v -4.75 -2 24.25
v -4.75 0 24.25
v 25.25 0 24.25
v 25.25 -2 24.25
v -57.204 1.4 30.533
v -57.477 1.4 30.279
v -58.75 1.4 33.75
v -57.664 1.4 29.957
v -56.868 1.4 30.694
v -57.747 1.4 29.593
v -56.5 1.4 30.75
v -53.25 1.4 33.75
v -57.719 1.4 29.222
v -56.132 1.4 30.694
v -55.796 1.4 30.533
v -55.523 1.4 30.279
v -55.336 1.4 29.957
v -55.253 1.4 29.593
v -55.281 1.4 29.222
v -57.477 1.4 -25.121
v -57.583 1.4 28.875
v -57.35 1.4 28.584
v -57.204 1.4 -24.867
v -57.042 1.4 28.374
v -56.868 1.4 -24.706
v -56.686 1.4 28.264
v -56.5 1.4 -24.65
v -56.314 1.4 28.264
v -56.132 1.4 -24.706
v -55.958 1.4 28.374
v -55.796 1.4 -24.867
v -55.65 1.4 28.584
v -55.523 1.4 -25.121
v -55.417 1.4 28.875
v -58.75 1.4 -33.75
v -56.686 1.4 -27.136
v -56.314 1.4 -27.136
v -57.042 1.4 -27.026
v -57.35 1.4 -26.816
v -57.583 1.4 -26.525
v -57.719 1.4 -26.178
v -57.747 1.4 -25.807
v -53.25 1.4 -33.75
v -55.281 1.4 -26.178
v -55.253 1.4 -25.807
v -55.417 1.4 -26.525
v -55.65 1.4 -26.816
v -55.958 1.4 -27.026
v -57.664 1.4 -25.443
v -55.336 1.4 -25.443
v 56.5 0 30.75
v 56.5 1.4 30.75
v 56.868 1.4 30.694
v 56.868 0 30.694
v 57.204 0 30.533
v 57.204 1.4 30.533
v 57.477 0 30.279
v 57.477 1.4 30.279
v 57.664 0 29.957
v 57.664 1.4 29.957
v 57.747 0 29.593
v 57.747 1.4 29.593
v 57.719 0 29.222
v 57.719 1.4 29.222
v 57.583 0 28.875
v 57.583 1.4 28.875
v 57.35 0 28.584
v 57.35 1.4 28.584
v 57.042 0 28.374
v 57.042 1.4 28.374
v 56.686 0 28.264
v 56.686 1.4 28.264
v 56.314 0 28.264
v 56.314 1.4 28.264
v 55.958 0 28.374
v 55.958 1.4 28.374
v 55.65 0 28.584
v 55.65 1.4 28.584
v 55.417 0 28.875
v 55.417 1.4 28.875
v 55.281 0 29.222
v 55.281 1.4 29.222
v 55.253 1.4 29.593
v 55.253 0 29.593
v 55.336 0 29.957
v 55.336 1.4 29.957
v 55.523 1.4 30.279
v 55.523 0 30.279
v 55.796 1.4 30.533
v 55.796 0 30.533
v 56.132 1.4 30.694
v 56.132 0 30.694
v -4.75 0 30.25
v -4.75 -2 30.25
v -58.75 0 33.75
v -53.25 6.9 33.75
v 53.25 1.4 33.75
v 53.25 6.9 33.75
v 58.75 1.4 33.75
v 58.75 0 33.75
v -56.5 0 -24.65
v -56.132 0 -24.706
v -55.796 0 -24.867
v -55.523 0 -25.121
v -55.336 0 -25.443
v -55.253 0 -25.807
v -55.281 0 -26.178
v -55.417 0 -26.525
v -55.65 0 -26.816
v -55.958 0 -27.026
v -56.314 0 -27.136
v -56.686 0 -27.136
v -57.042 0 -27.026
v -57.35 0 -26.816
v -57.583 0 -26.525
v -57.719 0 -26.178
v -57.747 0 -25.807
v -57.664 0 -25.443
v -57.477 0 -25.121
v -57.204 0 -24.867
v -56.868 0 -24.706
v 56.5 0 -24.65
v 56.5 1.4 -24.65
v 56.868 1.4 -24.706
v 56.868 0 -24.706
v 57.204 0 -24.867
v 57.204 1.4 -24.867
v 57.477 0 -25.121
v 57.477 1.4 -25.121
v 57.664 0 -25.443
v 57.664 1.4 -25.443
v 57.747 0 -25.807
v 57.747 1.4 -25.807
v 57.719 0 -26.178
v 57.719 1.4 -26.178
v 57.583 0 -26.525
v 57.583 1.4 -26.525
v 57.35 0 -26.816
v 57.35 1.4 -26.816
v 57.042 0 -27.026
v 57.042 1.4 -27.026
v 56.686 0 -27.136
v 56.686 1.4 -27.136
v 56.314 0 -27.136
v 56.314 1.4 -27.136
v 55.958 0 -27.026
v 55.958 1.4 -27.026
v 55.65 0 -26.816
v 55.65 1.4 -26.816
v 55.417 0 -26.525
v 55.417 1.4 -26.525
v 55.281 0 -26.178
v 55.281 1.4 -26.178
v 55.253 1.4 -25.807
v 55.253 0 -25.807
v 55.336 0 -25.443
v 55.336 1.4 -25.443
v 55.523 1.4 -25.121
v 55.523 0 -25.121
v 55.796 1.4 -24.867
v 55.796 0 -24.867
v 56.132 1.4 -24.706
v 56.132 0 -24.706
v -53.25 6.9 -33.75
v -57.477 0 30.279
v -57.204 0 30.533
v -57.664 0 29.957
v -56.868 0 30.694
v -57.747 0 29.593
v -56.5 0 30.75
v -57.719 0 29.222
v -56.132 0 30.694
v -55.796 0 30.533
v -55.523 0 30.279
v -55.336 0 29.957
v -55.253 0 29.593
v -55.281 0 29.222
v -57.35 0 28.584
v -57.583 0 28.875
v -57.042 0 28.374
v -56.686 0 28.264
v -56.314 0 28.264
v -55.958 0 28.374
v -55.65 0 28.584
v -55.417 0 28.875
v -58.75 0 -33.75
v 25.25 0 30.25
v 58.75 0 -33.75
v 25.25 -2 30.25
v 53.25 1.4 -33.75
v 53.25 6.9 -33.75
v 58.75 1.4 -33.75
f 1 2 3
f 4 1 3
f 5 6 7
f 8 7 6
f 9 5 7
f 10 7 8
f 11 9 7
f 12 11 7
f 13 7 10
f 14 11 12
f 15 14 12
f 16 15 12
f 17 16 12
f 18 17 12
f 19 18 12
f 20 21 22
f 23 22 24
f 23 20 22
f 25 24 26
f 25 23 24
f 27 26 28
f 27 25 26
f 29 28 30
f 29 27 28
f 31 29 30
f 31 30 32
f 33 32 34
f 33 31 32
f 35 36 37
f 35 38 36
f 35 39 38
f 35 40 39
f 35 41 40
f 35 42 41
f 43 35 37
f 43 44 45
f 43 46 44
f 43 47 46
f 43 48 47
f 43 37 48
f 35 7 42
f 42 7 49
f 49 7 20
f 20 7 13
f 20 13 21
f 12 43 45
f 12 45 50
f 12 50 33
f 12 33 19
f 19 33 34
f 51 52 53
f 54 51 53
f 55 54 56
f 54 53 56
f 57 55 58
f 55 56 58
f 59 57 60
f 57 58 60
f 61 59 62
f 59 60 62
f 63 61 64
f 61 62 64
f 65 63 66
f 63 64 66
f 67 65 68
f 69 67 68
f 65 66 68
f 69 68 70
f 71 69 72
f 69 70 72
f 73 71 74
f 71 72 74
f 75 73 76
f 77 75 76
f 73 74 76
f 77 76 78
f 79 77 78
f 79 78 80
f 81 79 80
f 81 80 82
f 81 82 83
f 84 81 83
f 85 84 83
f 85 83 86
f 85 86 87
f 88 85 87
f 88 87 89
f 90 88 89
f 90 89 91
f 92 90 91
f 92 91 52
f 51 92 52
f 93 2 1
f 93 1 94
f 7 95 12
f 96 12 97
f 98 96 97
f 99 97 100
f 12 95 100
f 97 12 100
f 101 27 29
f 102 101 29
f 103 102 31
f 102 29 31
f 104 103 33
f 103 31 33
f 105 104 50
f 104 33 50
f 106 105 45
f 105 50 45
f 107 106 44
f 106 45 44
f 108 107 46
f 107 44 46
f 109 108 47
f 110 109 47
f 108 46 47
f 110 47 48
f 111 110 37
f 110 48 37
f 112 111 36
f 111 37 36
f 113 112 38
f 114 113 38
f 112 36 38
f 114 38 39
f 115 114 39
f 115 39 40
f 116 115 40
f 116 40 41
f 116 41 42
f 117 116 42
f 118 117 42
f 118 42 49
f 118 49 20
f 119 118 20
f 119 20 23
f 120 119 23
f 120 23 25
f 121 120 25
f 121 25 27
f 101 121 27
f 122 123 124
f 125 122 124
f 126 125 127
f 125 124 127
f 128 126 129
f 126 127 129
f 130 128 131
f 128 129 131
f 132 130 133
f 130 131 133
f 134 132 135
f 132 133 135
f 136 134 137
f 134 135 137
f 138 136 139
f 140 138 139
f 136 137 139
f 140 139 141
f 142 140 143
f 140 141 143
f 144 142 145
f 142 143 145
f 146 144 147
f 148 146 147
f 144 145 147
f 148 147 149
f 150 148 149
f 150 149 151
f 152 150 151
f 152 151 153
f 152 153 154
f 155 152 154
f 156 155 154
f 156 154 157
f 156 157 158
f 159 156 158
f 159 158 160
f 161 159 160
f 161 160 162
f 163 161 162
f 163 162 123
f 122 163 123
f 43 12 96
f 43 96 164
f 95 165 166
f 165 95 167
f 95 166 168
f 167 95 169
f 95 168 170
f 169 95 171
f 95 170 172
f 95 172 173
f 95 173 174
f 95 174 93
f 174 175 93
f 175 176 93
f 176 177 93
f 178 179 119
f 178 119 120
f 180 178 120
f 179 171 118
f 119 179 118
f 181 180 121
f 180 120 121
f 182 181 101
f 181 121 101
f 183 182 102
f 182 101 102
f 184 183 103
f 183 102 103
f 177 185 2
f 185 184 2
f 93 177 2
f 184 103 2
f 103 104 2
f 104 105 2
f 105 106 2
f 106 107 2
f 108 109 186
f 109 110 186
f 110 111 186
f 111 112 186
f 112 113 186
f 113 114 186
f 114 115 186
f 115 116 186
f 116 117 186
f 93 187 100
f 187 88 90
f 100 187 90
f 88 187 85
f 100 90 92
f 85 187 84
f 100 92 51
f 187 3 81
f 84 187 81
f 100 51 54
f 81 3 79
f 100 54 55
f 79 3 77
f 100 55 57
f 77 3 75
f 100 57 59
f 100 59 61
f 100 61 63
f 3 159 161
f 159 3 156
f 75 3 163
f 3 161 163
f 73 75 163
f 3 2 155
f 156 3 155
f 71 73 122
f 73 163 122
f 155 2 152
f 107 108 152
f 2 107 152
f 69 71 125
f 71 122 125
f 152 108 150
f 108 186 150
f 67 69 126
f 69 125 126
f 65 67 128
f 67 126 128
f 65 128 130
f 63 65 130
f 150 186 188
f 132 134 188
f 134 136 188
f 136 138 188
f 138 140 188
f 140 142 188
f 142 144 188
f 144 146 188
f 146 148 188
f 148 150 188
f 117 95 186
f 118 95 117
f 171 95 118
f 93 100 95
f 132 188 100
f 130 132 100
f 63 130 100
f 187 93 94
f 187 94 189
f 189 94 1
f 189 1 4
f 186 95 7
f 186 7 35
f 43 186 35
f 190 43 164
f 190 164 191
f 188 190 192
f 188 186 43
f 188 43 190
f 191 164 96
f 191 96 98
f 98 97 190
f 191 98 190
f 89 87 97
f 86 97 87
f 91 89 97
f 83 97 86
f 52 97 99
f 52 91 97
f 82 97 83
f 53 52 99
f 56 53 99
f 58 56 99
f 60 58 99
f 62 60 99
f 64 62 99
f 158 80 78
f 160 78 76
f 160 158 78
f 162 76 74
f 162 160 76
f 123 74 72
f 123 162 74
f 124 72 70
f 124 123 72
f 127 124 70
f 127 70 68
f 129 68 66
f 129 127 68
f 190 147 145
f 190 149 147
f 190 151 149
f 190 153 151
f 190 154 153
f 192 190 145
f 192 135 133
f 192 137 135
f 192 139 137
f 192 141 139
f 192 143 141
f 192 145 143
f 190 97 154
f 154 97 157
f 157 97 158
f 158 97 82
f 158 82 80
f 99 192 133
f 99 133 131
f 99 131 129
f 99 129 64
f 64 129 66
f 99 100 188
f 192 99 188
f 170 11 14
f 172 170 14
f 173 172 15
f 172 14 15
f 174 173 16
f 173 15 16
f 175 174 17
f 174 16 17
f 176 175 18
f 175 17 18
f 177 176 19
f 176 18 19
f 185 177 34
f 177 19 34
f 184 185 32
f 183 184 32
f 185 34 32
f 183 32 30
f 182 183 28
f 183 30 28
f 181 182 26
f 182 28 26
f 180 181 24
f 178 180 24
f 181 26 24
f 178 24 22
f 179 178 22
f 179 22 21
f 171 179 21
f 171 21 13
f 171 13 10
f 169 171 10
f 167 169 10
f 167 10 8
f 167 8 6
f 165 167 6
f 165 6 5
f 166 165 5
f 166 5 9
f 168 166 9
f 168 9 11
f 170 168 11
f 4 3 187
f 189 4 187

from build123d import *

# Parameters (mm, degrees)
SKETCH_1_W          = 117.5
SKETCH_1_H          = 67.5
EXTRUDE_1_DEPTH     = 1.4
SKETCH_2_W          = 106.5
SKETCH_2_H          = 67.5
EXTRUDE_2_DEPTH     = 5.5
CUT_EXTRUDE_1_REACH = 69.977
SKETCH_5_R          = 1.25
SKETCH_6_W          = 30
SKETCH_6_H          = 6
EXTRUDE_3_DEPTH     = 2


with BuildPart() as part:
    # 草图1 → 凸台-拉伸1 (new body)
    with BuildSketch(Plane(origin=(0, 0, 0), x_dir=(1, 0, 0), z_dir=(0, 1, 0))):
        Rectangle(SKETCH_1_W, SKETCH_1_H)
    extrude(amount=EXTRUDE_1_DEPTH)

    # 草图2 → 凸台-拉伸2 (add)
    with BuildSketch(Plane(origin=(0, 1.4, 0), x_dir=(1, 0, 0), z_dir=(0, 1, 0))):
        Rectangle(SKETCH_2_W, SKETCH_2_H)
    extrude(amount=EXTRUDE_2_DEPTH)

    # 草图5 → 切除-拉伸1 (cut, up to next)
    with BuildSketch(Plane(origin=(0, 1.4, 0), x_dir=(1, 0, 0), z_dir=(0, 1, 0)), mode=Mode.PRIVATE) as cut_extrude_1_sk1:
        with Locations(Location((-56.5, -29.5, 0), (0, 0, 270))):
            Circle(SKETCH_5_R)
    cut_extrude_1_tool1 = extrude(cut_extrude_1_sk1.sketch, amount=-CUT_EXTRUDE_1_REACH, mode=Mode.PRIVATE) & part.part
    # 草图5 → 切除-拉伸1 (cut, up to next)
    with BuildSketch(Plane(origin=(0, 1.4, 0), x_dir=(1, 0, 0), z_dir=(0, 1, 0)), mode=Mode.PRIVATE) as cut_extrude_1_sk2:
        with Locations(Location((-56.5, 25.9, 0), (0, 0, 270))):
            Circle(SKETCH_5_R)
    cut_extrude_1_tool2 = extrude(cut_extrude_1_sk2.sketch, amount=-CUT_EXTRUDE_1_REACH, mode=Mode.PRIVATE) & part.part
    # 草图5 → 切除-拉伸1 (cut, up to next)
    with BuildSketch(Plane(origin=(0, 1.4, 0), x_dir=(1, 0, 0), z_dir=(0, 1, 0)), mode=Mode.PRIVATE) as cut_extrude_1_sk3:
        with Locations(Location((56.5, 25.9, 0), (0, 0, 270))):
            Circle(SKETCH_5_R)
    cut_extrude_1_tool3 = extrude(cut_extrude_1_sk3.sketch, amount=-CUT_EXTRUDE_1_REACH, mode=Mode.PRIVATE) & part.part
    # 草图5 → 切除-拉伸1 (cut, up to next)
    with BuildSketch(Plane(origin=(0, 1.4, 0), x_dir=(1, 0, 0), z_dir=(0, 1, 0)), mode=Mode.PRIVATE) as cut_extrude_1_sk4:
        with Locations(Location((56.5, -29.5, 0), (0, 0, 270))):
            Circle(SKETCH_5_R)
    cut_extrude_1_tool4 = extrude(cut_extrude_1_sk4.sketch, amount=-CUT_EXTRUDE_1_REACH, mode=Mode.PRIVATE) & part.part
    add(cut_extrude_1_tool1.solids().sort_by_distance((-56.5, 1.4, 29.5))[0], mode=Mode.SUBTRACT)
    add(cut_extrude_1_tool2.solids().sort_by_distance((-56.5, 1.4, -25.9))[0], mode=Mode.SUBTRACT)
    add(cut_extrude_1_tool3.solids().sort_by_distance((56.5, 1.4, -25.9))[0], mode=Mode.SUBTRACT)
    add(cut_extrude_1_tool4.solids().sort_by_distance((56.5, 1.4, 29.5))[0], mode=Mode.SUBTRACT)

    # 草图6 → 凸台-拉伸3 (add)
    with BuildSketch(Plane.XZ):
        with Locations((10.25, 27.25)):
            Rectangle(SKETCH_6_W, SKETCH_6_H)
    extrude(amount=EXTRUDE_3_DEPTH)


solid = part.part
